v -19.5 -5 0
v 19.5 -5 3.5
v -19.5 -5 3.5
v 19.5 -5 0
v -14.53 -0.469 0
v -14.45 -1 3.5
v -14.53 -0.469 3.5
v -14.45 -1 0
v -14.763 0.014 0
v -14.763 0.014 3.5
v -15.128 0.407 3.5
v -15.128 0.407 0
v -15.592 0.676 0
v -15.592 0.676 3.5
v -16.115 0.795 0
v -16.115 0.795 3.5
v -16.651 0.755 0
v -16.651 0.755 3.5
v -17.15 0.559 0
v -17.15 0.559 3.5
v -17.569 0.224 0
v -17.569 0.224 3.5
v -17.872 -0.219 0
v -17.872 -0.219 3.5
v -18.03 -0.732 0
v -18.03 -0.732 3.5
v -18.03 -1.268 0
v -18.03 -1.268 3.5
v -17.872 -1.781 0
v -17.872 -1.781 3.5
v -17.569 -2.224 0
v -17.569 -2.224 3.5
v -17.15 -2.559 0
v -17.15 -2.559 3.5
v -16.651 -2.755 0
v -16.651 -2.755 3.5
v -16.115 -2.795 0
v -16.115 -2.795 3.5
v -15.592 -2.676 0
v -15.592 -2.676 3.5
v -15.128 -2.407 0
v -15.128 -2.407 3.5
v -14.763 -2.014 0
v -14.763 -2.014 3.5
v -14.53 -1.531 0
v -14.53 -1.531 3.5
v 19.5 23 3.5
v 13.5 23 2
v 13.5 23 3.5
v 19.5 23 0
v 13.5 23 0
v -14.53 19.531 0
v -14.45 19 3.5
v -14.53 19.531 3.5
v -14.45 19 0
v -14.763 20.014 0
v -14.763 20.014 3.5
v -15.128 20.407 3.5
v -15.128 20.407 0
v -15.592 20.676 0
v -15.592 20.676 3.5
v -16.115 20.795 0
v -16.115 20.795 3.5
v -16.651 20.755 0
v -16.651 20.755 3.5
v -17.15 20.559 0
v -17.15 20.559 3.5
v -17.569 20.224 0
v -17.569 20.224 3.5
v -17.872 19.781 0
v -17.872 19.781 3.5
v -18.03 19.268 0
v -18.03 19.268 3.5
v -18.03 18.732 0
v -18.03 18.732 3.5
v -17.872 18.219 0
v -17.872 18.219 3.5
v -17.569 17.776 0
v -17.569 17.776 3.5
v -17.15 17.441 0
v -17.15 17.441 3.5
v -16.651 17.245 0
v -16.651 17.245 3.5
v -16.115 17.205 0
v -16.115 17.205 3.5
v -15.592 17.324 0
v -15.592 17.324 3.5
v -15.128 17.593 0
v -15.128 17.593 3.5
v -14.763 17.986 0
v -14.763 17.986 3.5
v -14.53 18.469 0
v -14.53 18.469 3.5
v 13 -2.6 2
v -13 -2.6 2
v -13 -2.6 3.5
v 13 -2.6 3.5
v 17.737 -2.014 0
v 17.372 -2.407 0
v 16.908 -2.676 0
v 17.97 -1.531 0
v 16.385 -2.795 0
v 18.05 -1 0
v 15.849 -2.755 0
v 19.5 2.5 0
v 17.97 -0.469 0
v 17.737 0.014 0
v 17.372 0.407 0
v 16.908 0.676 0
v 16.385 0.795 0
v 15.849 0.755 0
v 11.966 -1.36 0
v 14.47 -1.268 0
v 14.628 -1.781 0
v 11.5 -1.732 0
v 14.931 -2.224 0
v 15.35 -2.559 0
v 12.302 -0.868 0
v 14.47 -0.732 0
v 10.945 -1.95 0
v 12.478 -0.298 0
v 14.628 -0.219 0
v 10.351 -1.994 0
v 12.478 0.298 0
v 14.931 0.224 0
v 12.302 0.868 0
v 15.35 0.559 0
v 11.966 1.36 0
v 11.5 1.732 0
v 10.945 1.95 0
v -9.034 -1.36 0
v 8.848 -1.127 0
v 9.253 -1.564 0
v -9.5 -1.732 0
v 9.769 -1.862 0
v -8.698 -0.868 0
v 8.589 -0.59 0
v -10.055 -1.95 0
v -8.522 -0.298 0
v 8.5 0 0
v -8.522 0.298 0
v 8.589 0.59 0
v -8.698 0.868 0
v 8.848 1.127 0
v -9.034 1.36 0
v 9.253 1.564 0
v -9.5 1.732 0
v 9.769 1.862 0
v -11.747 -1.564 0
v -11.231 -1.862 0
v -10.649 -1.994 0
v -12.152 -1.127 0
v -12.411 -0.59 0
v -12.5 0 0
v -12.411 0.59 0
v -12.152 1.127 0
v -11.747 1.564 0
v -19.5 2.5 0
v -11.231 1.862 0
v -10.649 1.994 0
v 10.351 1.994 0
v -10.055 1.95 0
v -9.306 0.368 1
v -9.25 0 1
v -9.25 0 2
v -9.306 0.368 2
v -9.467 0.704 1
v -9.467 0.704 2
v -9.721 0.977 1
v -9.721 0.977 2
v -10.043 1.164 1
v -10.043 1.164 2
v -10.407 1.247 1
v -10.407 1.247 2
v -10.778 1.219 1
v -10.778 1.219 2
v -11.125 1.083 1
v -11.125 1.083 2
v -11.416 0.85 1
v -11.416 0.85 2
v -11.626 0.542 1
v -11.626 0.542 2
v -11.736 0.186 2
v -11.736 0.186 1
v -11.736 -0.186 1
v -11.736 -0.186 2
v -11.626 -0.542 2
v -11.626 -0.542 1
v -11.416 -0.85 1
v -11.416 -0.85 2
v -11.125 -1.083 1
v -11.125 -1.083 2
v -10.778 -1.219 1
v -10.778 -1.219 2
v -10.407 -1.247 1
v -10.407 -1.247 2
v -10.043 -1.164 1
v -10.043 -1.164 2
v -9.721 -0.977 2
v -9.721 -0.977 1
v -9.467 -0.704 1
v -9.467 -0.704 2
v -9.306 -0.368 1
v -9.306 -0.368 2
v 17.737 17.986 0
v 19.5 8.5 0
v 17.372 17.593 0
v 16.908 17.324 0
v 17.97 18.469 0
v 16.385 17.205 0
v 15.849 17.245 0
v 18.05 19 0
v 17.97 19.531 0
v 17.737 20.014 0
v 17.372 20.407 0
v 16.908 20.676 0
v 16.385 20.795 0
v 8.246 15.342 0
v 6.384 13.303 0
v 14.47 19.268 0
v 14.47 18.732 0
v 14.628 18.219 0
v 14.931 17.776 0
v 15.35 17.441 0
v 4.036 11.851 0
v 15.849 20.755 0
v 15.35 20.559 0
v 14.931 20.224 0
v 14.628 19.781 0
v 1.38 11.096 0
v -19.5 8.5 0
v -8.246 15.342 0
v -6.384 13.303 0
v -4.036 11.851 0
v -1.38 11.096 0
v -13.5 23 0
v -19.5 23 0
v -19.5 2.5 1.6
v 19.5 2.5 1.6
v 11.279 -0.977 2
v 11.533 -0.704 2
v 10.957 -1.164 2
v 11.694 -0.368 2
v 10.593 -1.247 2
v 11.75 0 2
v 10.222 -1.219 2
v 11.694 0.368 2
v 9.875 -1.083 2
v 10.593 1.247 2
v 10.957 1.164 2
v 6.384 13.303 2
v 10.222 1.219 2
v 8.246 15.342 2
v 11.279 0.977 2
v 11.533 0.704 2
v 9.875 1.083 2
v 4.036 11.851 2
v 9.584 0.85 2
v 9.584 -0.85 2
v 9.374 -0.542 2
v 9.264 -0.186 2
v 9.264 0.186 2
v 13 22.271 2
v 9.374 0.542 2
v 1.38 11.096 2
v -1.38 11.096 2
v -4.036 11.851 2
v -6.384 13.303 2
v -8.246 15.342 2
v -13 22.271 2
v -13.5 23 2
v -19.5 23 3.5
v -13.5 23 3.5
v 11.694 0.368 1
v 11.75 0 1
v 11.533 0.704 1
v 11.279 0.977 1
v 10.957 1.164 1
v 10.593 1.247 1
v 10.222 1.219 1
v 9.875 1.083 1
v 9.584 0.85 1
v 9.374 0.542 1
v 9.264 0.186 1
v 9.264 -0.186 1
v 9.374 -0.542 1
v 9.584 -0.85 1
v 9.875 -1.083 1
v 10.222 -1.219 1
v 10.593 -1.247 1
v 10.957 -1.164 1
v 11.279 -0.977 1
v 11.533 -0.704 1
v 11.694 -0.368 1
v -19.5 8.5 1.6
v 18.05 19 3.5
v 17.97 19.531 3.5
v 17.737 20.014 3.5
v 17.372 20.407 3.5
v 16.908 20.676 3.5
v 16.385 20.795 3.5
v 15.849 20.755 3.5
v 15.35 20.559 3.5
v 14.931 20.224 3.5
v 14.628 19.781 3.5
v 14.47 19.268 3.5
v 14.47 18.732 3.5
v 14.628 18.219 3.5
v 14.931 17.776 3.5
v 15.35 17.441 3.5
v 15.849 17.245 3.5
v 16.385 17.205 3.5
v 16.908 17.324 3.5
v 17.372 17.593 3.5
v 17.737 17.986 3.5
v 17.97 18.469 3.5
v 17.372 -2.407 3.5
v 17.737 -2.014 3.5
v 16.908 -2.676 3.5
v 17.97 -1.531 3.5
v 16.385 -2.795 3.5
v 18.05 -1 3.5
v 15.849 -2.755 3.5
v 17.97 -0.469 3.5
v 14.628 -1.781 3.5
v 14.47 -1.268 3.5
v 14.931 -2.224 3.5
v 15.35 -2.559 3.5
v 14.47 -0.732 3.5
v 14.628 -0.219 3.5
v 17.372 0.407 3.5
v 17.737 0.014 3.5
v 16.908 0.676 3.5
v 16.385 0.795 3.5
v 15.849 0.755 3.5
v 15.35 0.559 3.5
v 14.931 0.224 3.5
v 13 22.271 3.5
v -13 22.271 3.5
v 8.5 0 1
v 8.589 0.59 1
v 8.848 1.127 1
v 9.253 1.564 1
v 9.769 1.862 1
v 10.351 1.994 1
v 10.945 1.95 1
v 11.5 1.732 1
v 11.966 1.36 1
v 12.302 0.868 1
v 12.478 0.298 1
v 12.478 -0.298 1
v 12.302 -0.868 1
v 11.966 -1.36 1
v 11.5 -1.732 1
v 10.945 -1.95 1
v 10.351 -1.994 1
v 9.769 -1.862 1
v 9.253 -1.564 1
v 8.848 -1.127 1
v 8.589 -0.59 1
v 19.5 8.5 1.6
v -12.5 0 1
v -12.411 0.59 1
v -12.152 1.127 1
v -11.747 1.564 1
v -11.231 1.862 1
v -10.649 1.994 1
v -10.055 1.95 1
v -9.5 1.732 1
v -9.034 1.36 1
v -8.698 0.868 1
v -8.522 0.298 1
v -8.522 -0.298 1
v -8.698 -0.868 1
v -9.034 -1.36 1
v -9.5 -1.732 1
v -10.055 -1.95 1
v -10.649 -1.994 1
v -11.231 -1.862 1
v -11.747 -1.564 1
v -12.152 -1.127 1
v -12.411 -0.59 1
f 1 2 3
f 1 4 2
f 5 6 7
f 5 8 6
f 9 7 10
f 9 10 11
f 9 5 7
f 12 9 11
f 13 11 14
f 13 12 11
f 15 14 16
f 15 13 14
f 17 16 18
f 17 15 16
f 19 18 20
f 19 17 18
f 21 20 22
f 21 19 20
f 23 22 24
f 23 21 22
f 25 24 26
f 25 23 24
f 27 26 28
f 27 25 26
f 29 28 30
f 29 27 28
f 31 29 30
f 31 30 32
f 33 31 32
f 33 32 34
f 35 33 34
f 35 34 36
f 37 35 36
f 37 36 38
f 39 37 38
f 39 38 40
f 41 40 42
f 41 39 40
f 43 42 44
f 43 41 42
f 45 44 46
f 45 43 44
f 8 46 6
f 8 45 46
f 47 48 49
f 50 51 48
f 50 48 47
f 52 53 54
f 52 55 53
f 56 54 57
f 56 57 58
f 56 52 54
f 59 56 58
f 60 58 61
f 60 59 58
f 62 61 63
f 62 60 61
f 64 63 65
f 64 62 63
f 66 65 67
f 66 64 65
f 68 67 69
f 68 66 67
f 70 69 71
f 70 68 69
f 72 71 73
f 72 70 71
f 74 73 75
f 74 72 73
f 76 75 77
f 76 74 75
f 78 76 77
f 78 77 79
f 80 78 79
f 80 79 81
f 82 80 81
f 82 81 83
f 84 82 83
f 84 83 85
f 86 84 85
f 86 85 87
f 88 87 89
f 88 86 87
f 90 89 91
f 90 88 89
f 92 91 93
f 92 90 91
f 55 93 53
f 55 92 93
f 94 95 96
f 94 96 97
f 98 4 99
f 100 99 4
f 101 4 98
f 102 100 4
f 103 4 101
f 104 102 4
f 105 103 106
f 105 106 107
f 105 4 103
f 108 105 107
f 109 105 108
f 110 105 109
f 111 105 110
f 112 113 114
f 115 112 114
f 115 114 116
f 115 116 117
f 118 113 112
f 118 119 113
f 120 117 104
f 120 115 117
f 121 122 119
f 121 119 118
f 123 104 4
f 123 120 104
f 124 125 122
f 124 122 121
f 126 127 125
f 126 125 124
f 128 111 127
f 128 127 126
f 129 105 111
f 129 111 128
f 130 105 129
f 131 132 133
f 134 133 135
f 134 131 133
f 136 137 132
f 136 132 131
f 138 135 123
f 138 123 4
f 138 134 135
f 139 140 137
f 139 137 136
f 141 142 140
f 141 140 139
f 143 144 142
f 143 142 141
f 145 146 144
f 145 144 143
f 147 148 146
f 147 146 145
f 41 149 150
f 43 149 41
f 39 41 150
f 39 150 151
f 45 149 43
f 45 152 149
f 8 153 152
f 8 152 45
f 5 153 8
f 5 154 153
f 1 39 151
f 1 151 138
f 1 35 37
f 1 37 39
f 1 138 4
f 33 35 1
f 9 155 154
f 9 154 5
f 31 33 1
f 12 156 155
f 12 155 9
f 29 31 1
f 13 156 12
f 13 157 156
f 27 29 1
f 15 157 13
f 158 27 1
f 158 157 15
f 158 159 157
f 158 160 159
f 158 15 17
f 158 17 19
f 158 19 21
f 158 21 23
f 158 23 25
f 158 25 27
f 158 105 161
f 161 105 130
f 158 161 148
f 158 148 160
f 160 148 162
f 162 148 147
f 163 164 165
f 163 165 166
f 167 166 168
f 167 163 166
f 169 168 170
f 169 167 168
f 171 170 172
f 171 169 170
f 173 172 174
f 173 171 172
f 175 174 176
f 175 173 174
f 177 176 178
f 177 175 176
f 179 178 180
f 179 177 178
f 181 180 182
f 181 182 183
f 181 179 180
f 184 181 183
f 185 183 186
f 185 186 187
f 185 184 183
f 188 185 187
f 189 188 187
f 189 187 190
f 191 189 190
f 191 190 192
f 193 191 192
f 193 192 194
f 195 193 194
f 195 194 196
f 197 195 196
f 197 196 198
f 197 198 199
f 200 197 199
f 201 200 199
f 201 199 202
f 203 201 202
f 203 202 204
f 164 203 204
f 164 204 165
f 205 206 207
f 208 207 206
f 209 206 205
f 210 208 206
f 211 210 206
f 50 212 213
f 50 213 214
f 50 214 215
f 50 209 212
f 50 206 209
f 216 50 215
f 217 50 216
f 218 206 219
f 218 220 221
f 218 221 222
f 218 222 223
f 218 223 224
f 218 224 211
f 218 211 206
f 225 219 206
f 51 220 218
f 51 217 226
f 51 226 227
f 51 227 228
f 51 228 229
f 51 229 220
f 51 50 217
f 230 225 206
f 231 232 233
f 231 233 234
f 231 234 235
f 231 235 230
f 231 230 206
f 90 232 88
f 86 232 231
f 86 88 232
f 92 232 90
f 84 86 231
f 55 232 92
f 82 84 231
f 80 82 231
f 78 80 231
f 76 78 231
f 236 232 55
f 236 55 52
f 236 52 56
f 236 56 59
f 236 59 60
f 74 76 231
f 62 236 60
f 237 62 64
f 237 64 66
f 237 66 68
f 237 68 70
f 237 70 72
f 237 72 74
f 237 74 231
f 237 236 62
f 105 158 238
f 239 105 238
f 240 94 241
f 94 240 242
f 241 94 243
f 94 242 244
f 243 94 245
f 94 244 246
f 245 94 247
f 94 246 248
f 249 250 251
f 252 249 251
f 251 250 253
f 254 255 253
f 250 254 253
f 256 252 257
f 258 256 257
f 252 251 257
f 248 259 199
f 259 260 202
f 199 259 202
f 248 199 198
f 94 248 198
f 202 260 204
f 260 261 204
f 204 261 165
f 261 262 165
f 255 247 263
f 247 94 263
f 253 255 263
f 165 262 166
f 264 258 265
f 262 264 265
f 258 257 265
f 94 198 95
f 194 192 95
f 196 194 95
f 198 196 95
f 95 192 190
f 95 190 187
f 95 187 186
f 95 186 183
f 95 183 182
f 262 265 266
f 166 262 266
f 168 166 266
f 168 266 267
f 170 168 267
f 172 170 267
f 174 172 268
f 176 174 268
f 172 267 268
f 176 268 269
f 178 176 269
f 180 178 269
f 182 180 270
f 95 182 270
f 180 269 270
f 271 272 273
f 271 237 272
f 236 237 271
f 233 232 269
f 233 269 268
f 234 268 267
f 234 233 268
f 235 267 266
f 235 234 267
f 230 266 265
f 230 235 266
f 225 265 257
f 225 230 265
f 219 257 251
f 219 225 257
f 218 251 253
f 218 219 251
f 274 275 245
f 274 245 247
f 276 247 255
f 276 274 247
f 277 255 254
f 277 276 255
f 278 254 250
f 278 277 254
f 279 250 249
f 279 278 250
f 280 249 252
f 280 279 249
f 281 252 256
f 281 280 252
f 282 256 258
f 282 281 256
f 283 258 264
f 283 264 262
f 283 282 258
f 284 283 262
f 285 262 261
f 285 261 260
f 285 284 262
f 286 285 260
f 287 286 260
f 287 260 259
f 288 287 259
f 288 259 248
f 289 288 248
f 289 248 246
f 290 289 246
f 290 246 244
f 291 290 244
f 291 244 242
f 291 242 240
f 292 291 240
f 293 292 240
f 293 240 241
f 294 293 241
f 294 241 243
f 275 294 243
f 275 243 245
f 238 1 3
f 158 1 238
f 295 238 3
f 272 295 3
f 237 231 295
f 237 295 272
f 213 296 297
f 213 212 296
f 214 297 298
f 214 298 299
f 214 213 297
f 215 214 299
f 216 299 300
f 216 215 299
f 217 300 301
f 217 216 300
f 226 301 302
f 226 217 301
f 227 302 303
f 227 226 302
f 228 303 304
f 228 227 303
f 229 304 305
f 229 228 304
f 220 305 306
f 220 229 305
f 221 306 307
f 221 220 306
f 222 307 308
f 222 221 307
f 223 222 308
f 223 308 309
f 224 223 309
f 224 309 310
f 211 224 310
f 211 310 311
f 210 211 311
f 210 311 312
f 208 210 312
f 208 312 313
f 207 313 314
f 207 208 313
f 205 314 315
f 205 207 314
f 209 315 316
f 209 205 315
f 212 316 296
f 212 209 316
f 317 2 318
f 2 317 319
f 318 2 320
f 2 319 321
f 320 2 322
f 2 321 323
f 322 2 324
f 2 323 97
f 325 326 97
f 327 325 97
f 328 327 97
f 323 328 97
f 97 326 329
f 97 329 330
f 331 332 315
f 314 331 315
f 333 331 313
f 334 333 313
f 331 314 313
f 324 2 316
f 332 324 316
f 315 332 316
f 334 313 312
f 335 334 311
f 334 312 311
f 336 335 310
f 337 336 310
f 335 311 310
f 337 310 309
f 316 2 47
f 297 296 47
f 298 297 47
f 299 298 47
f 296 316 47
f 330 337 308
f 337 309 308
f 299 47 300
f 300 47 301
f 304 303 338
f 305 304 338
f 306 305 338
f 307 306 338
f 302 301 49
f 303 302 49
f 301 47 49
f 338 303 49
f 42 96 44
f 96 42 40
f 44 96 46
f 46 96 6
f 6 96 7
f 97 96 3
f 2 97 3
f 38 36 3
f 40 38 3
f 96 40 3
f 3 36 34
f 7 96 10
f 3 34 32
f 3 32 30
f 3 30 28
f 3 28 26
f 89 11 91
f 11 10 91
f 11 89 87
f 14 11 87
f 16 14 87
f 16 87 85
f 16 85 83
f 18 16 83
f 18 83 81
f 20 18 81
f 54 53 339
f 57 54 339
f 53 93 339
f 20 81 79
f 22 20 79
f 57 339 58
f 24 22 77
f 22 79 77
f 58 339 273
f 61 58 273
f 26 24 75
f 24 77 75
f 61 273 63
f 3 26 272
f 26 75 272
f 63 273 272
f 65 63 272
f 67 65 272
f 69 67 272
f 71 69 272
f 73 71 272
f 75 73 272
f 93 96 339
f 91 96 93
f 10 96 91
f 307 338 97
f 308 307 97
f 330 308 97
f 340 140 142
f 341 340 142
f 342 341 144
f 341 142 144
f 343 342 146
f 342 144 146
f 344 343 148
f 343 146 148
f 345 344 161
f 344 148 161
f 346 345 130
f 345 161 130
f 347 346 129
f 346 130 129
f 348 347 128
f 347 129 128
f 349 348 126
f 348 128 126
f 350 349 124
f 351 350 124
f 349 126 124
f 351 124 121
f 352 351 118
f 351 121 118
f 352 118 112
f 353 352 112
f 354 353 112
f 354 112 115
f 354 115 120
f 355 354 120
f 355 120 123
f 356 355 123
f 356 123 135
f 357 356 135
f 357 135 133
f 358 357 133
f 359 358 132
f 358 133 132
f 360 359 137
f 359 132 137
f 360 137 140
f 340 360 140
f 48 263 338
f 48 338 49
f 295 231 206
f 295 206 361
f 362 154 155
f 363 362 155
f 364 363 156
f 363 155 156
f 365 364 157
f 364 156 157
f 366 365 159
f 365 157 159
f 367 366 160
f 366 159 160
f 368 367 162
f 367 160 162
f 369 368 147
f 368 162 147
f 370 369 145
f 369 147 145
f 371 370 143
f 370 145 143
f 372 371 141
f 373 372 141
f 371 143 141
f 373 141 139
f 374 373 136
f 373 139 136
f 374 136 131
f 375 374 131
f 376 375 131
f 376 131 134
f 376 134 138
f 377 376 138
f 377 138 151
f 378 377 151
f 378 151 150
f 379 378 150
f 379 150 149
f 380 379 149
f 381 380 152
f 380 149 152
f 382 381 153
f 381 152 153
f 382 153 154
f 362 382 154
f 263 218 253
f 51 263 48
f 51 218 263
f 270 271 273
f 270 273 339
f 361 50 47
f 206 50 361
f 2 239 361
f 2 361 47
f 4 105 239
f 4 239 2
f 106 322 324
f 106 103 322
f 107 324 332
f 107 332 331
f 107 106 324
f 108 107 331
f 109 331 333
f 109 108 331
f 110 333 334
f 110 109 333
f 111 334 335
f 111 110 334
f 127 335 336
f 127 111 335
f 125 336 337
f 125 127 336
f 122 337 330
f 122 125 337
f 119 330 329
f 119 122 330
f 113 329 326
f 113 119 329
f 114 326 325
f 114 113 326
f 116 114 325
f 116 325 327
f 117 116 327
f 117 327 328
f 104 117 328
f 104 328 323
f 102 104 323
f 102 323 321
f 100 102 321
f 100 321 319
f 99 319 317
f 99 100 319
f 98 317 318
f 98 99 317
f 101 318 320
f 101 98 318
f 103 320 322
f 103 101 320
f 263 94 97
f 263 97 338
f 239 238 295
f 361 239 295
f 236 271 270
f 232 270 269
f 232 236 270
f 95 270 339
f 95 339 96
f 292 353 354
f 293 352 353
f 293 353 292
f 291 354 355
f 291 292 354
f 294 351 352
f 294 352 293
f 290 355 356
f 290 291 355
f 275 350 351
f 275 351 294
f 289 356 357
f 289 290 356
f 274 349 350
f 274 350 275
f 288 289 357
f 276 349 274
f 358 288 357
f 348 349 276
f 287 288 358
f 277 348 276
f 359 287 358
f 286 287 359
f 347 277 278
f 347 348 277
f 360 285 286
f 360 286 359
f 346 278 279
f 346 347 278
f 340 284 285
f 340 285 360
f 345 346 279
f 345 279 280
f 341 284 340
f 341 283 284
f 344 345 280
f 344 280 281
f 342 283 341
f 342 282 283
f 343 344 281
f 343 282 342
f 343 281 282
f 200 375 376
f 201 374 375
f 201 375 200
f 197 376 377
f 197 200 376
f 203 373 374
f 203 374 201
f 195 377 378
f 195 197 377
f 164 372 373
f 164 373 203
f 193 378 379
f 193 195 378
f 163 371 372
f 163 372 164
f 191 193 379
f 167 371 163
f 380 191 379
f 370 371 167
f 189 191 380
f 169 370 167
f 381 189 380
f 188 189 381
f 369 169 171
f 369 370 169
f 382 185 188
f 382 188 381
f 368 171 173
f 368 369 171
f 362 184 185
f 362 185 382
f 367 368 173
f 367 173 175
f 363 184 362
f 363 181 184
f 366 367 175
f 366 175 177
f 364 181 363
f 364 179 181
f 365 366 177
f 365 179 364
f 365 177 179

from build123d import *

# Parameters (mm, degrees)
SKETCH_1_R          = 1.25
SKETCH_1_R_2        = 1.8
EXTRUDE_1_DEPTH     = 2
SKETCH_3_R          = 1.8
EXTRUDE_2_DEPTH     = 1.5
SKETCH_4_R          = 2
CUT_EXTRUDE_1_DEPTH = 1
SKETCH_5_W          = 1.6
SKETCH_5_H          = 6
CUT_EXTRUDE_6_DEPTH = 40


with BuildPart() as part:
    # ｽｹｯﾁ1 → ﾎﾞｽ - 押し出し1 (new body)
    with BuildSketch(Plane.XY):
        with BuildLine():
            Line((19.5, -5), (-19.5, -5))
            Line((-19.5, -5), (-19.5, 23))
            Line((-19.5, 23), (-13.5, 23))
            Line((-13.5, 23), (-8.245593322, 15.342245077))
            ThreePointArc((-8.245593322, 15.342245077), (0, 11), (8.245593322, 15.342245077))
            Line((8.245593322, 15.342245077), (13.5, 23))
            Line((13.5, 23), (19.5, 23))
            Line((19.5, 23), (19.5, -5))
        make_face()
        with Locations((-10.5, 0)):
            Circle(SKETCH_1_R, mode=Mode.SUBTRACT)
        with Locations((10.5, 0)):
            Circle(SKETCH_1_R, mode=Mode.SUBTRACT)
        with Locations((-16.25, -1)):
            Circle(SKETCH_1_R_2, mode=Mode.SUBTRACT)
        with Locations((-16.25, 19)):
            Circle(SKETCH_1_R_2, mode=Mode.SUBTRACT)
        with Locations((16.25, -1)):
            Circle(SKETCH_1_R_2, mode=Mode.SUBTRACT)
        with Locations((16.25, 19)):
            Circle(SKETCH_1_R_2, mode=Mode.SUBTRACT)
    extrude(amount=EXTRUDE_1_DEPTH)

    # ｽｹｯﾁ3 → ﾎﾞｽ - 押し出し2 (add)
    with BuildSketch(Plane.XY.offset(2)):
        Polygon((-13, 22.271301653), (-13, -2.6), (13, -2.6), (13, 22.271301653), (13.5, 23), (19.5, 23), (19.5, -5), (-19.5, -5), (-19.5, 23), (-13.5, 23), align=None)
        with Locations((-16.25, 19)):
            Circle(SKETCH_3_R, mode=Mode.SUBTRACT)
        with Locations((-16.25, -1)):
            Circle(SKETCH_3_R, mode=Mode.SUBTRACT)
        with Locations((16.25, -1)):
            Circle(SKETCH_3_R, mode=Mode.SUBTRACT)
        with Locations((16.25, 19)):
            Circle(SKETCH_3_R, mode=Mode.SUBTRACT)
    extrude(amount=EXTRUDE_2_DEPTH)

    # ｽｹｯﾁ4 → ｶｯﾄ - 押し出し1 (cut)
    with BuildSketch(Plane(origin=(0, 0, 0), x_dir=(-1, 0, 0), z_dir=(0, 0, -1))):
        with Locations((-10.5, 0)):
            Circle(SKETCH_4_R)
        with Locations((10.5, 0)):
            Circle(SKETCH_4_R)
    extrude(amount=-CUT_EXTRUDE_1_DEPTH, mode=Mode.SUBTRACT)

    # ｽｹｯﾁ5 → ｶｯﾄ - 押し出し6 (cut, through all)
    with BuildSketch(Plane.ZY.offset(19.5)):
        with Locations((0.8, 5.5)):
            Rectangle(SKETCH_5_W, SKETCH_5_H)
    extrude(amount=-CUT_EXTRUDE_6_DEPTH, mode=Mode.SUBTRACT)


solid = part.part
